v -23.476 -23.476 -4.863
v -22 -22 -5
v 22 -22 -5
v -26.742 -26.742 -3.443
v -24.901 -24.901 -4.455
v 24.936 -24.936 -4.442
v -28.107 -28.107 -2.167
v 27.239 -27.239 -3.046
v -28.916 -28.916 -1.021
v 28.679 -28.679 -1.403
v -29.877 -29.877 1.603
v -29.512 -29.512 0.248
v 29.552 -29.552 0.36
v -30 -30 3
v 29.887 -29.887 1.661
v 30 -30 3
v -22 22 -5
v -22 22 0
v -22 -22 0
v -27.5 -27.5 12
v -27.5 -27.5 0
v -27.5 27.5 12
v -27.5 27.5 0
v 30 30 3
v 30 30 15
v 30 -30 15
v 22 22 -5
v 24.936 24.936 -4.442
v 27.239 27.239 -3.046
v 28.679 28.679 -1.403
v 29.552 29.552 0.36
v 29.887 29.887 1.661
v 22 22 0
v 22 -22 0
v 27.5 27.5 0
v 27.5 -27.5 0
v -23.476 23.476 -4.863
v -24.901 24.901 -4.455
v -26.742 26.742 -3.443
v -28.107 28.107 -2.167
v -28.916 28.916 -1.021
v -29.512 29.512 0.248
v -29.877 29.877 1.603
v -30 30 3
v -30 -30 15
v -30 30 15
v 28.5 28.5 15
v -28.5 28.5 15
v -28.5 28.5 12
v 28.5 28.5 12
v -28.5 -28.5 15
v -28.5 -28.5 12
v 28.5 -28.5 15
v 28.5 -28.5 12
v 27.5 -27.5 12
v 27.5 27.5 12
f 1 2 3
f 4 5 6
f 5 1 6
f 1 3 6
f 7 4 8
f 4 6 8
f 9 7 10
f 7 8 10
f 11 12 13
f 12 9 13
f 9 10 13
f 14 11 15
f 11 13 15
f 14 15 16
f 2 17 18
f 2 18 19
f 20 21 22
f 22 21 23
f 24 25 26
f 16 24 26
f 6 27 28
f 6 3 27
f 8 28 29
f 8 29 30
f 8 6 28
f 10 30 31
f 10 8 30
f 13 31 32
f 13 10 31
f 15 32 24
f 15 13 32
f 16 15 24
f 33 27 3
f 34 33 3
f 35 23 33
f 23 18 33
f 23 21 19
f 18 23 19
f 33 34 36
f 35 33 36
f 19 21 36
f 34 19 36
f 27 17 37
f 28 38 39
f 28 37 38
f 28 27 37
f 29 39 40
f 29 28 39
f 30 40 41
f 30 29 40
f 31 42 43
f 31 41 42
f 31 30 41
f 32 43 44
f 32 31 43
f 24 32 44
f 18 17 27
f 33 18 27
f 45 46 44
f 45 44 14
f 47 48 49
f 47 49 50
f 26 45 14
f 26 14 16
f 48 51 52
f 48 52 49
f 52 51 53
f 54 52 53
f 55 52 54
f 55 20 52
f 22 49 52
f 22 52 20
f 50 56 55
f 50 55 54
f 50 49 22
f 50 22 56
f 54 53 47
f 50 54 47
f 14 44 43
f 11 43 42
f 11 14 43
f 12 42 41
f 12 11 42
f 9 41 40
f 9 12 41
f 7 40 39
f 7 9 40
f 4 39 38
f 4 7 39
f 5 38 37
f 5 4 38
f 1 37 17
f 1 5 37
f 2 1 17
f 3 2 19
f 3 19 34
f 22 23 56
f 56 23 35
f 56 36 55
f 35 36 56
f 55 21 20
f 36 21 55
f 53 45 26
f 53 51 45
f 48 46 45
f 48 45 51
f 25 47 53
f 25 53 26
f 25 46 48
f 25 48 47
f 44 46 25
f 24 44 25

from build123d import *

# Parameters (mm, degrees)
F0_W     = 60
F0_H     = 60
F0_W_2   = 55
F0_H_2   = 55
F1_DEPTH = 15
F2_W     = 60
F2_H     = 60
F2_W_2   = 55
F2_H_2   = 55
F3_DEPTH = 5
F4_W     = 57
F4_H     = 57
F4_W_2   = 55
F4_H_2   = 55
F5_DEPTH = 3
F6_R     = 8
F7_W     = 44
F7_H     = 44
F8_DEPTH = 5


with BuildPart() as f1:
    # F0 (on Top) → F1 (new body)
    with BuildSketch(Plane.XY):
        Rectangle(F0_W, F0_H)
        Rectangle(F0_W_2, F0_H_2, mode=Mode.SUBTRACT)
    extrude(amount=F1_DEPTH)

    # F2 (on face) → F3 (join)
    with BuildSketch(Plane(origin=(0, 0, 0), x_dir=(1, 0, 0), z_dir=(0, 0, -1))):
        Rectangle(F2_W, F2_H)
        Rectangle(F2_W_2, F2_H_2, mode=Mode.SUBTRACT)
        Rectangle(F2_W_2, F2_H_2)
    extrude(amount=F3_DEPTH)

    # F4 (on face) → F5 (cut)
    with BuildSketch(Plane.XY.offset(15)):
        Rectangle(F4_W, F4_H)
        Rectangle(F4_W_2, F4_H_2, mode=Mode.SUBTRACT)
    extrude(amount=-F5_DEPTH, mode=Mode.SUBTRACT)

    # F6
    f6_edges = [f1.edges().sort_by_distance(p)[0] for p in [
        (-30, 0, -5),
        (30, 0, -5),
        (0, 30, -5),
        (0, -30, -5),
    ]]
    fillet(f6_edges, radius=F6_R)

    # F7 (on face) → F8 (cut)
    with BuildSketch(Plane(origin=(0, 0, -5), x_dir=(1, 0, 0), z_dir=(0, 0, -1))):
        Rectangle(F7_W, F7_H)
    extrude(amount=-F8_DEPTH, mode=Mode.SUBTRACT)


solid = f1.part
